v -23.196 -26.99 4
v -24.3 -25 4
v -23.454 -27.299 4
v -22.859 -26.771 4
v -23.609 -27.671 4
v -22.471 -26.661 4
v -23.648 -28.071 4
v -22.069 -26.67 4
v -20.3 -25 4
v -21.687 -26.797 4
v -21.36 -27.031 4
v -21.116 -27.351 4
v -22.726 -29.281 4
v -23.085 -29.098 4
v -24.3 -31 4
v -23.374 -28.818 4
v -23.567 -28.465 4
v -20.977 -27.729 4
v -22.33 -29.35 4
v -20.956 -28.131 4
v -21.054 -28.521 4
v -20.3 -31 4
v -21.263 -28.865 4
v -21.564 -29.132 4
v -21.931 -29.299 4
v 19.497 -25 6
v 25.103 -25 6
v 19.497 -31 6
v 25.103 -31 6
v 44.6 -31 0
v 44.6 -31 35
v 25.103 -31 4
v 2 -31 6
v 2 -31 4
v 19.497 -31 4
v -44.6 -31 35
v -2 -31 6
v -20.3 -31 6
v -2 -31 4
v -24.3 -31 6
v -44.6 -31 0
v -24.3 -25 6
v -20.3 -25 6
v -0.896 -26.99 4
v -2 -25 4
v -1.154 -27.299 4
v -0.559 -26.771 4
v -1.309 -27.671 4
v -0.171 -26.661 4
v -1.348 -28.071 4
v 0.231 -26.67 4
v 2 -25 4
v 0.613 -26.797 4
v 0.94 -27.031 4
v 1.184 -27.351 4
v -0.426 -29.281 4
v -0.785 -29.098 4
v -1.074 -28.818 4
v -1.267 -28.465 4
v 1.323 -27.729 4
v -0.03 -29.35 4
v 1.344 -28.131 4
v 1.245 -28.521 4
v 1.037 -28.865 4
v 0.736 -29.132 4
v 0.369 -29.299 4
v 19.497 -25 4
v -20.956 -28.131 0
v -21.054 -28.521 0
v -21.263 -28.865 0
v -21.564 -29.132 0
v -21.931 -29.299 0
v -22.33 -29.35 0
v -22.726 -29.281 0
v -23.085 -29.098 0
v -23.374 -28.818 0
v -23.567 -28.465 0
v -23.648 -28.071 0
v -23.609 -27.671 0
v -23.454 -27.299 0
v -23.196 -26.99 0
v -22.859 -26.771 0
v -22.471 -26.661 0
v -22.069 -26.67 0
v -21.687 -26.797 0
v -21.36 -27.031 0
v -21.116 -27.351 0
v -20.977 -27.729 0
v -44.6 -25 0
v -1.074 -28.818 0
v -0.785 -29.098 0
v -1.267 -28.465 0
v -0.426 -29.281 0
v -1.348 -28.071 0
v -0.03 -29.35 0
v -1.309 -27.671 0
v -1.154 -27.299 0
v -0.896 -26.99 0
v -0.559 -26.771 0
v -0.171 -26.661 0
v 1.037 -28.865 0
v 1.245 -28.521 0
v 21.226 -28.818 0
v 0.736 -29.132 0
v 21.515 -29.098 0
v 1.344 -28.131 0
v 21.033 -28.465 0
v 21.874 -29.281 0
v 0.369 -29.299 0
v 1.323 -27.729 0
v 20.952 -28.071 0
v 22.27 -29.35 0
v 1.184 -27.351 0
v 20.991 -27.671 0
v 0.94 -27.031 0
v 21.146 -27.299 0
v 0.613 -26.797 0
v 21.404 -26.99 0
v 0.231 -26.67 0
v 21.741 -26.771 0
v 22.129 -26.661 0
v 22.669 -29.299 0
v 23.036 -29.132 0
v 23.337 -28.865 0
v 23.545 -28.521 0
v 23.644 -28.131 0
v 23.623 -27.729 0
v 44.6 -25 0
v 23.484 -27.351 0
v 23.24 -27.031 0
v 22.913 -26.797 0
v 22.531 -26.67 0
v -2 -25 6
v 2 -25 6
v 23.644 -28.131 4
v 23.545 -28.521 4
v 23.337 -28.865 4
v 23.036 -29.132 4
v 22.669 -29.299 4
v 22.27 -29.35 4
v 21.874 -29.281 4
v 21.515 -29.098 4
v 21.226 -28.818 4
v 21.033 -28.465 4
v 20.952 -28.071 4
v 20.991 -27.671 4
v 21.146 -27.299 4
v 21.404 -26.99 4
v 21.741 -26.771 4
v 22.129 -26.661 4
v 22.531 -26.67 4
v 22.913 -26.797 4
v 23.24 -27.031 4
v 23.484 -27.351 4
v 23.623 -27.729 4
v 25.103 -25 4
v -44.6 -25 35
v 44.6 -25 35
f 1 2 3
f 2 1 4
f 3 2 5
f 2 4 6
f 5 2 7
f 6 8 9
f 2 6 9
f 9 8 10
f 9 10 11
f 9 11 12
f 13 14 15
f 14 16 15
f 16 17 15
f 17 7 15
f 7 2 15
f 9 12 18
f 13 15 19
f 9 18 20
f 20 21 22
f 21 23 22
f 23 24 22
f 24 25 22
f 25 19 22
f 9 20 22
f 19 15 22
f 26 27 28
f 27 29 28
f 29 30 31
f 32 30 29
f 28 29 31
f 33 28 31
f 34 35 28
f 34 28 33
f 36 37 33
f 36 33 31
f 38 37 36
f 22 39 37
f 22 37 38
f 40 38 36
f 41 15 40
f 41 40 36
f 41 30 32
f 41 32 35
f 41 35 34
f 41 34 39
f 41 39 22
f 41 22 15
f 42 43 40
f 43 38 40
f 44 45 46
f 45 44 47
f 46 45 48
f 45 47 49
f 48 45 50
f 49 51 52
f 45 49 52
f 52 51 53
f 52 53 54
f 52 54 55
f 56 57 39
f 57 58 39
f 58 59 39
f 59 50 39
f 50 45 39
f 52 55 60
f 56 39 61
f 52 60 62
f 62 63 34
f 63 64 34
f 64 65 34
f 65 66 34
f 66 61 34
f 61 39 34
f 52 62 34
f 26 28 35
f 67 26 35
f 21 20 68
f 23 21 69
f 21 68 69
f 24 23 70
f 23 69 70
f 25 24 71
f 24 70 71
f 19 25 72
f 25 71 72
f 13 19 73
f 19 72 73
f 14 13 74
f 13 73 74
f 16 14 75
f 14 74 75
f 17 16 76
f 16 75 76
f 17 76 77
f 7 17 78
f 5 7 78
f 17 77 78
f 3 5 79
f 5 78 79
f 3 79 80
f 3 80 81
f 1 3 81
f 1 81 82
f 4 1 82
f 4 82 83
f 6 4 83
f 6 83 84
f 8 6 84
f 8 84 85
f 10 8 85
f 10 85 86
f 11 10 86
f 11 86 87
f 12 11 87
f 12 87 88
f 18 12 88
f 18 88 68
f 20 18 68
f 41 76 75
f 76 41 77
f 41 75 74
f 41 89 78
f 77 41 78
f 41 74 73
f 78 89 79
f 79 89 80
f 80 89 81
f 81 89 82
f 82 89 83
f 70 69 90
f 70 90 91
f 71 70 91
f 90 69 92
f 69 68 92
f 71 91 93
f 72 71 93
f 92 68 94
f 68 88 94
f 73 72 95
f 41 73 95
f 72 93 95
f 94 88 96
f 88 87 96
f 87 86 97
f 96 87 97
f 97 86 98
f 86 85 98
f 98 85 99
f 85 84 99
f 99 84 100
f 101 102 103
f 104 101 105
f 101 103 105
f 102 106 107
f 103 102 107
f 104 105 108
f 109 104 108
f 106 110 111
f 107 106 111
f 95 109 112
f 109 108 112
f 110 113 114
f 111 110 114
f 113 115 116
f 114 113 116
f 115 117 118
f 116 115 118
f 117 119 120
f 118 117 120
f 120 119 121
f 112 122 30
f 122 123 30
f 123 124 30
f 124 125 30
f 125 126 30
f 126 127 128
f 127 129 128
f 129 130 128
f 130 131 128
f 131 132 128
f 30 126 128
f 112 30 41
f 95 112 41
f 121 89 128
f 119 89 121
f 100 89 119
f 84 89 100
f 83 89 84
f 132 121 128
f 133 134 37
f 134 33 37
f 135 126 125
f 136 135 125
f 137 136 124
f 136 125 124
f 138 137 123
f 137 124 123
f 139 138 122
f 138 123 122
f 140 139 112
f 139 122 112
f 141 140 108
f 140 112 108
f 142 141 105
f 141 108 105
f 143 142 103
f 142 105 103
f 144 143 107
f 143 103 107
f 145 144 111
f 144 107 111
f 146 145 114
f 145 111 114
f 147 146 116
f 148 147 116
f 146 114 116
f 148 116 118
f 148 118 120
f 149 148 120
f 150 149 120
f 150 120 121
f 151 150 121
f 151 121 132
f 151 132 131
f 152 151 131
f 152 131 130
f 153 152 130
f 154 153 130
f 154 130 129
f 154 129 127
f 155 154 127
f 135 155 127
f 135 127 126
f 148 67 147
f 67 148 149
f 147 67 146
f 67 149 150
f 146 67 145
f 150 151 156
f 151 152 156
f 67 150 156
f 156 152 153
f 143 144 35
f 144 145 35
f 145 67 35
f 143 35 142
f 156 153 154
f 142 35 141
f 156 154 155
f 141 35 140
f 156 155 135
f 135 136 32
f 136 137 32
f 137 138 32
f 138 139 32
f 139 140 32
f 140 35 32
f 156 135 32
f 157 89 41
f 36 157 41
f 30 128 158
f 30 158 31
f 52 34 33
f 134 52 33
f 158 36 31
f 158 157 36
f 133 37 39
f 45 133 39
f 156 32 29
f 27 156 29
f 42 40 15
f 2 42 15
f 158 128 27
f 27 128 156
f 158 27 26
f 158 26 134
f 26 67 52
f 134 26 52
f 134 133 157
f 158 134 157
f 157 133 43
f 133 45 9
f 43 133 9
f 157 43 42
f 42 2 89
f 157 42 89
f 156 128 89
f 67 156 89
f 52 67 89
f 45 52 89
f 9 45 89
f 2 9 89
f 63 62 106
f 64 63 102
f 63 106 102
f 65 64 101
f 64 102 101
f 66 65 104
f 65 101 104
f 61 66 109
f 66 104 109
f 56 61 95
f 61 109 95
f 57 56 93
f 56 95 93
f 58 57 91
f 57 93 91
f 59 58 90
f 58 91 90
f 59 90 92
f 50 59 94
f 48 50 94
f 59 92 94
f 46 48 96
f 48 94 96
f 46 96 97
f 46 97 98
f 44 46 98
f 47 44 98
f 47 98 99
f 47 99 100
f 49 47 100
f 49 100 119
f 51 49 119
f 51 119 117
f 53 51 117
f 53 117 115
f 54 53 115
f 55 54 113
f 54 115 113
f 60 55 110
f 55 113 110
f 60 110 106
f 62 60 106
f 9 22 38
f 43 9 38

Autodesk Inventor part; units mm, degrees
ref_plane "YZ Plane" through (0, 0, 0) normal (1, 0, 0) x (0, 1, 0)
ref_plane "XZ Plane" through (0, 0, 0) normal (0, 1, 0) x (-1, 0, 0)
ref_plane "XY Plane" through (0, 0, 0) normal (0, 0, 1) x (1, 0, 0)
ref_plane "작업 평면4" through (-1.8693, 3.0801, 0) normal (0, 0, 1) x (0.9953009, -0.0968305, 0)
sketch "스케치1" plane through (-1.8693, 3.0801, 0) normal (0, 0, 1) x (0.9953009, -0.0968305, 0)
  circle A0 centre (-22.7477, 22.8243) radius 1.35 projected
  circle A1 centre (-43.8827, -21.2142) radius 1.35 projected
  circle A2 centre (21.6428, 27.143) radius 1.35 projected
  circle A3 centre (4.8701, -30.7532) radius 1.35 projected
  circle A4 centre (27.0653, -28.5939) radius 1.35 projected
  circle A5 centre (-0.5524, 24.9836) radius 1.35 projected
  circle A6 centre (-46.013, 0.6824) radius 1.3956 projected
  circle A7 centre (48.7397, 9.9006) radius 1.35 projected
  circle A8 centre (-17.3251, -32.9125) radius 1.35 projected
  circle A9 centre (50.8699, -11.996) radius 1.35 projected
  line L0 (68.8179, -26.0788) -> (63.0972, 32.7232) projected
  line L1 (60.913, 34.5202) -> (-62.7034, 22.4938) projected
  line L2 (-64.5004, 20.3096) -> (-58.7796, -38.4925) projected
  line L3 (-56.5954, -40.2895) -> (67.021, -28.2631) projected
  circle A10 centre (-49.3569, -21.7468) radius 1.35 projected
  circle A11 centre (-29.5905, 2.2801) radius 1.35 projected
  circle A12 centre (-51.4871, 0.1498) radius 1.35 projected
  circle A13 centre (-27.4602, -19.6165) radius 1.35 projected
  circle A14 centre (-38.4085, -20.6817) radius 1.35 projected
  circle A15 centre (-40.5388, 1.215) radius 1.35 projected
  circle A16 centre (34.4475, -13.5937) radius 1.35 projected
  circle A17 centre (54.2138, 10.4332) radius 1.35 projected
  circle A18 centre (45.3958, -12.5285) radius 1.35 projected
  circle A19 centre (32.3172, 8.3029) radius 1.35 projected
  circle A20 centre (43.2655, 9.3681) radius 1.35 projected
  circle A21 centre (56.3441, -11.4634) radius 1.35 projected
  circle A22 centre (-22.7477, 22.8243) radius 1.35 projected
  circle A23 centre (-43.8827, -21.2142) radius 1.35 projected
  circle A24 centre (21.6428, 27.143) radius 1.35 projected
  circle A25 centre (4.8701, -30.7532) radius 1.35 projected
  circle A26 centre (27.0653, -28.5939) radius 1.35 projected
  circle A27 centre (-0.5524, 24.9836) radius 1.35 projected
  circle A28 centre (-46.013, 0.6824) radius 1.3956 projected
  circle A29 centre (48.7397, 9.9006) radius 1.35 projected
  circle A30 centre (-17.3251, -32.9125) radius 1.35 projected
  circle A31 centre (50.8699, -11.996) radius 1.35 projected
  line L4 (68.8179, -26.0788) -> (63.0972, 32.7232) projected
  line L5 (-56.5954, -40.2895) -> (67.021, -28.2631) projected
  line L6 (-64.5004, 20.3096) -> (-58.7796, -38.4925) projected
  line L7 (60.913, 34.5202) -> (-62.7034, 22.4938) projected
  circle A32 centre (-49.3569, -21.7468) radius 1.35 projected
  circle A33 centre (-29.5905, 2.2801) radius 1.35 projected
  circle A34 centre (-51.4871, 0.1498) radius 1.35 projected
  circle A35 centre (-27.4602, -19.6165) radius 1.35 projected
  circle A36 centre (-38.4085, -20.6817) radius 1.35 projected
  circle A37 centre (-40.5388, 1.215) radius 1.35 projected
  circle A38 centre (34.4475, -13.5937) radius 1.35 projected
  circle A39 centre (54.2138, 10.4332) radius 1.35 projected
  circle A40 centre (45.3958, -12.5285) radius 1.35 projected
  circle A41 centre (32.3172, 8.3029) radius 1.35 projected
  circle A42 centre (43.2655, 9.3681) radius 1.35 projected
  circle A43 centre (56.3441, -11.4634) radius 1.35 projected
  line L8 (48.97, -23.4487) -> (-39.8109, -32.0859) projected
  line L9 (-39.8109, -32.0859) -> (-39.2299, -38.0578) projected
  line L10 (55.5228, -28.8395) -> (-45.2017, -38.6387) projected
  circle A44 centre (-17.3251, -32.9125) radius 1.35 projected
  circle A45 centre (4.8701, -30.7532) radius 1.35 projected
  circle A46 centre (27.0653, -28.5939) radius 1.35 projected
  line L11 (48.97, -23.4487) -> (-39.8109, -32.0859) projected
  line L12 (48.97, -23.4487) -> (49.551, -29.4205) projected
  circle A47 centre (-26.4824, -26.5694) radius 1.6 projected
  circle A48 centre (34.8281, -20.6047) radius 1.6 projected
  circle A49 centre (-30.5105, 14.8351) radius 1.6 projected
  circle A50 centre (30.8, 20.7999) radius 1.6 projected
  circle A51 centre (-26.4824, -26.5694) radius 1.6 projected
  circle A52 centre (34.8281, -20.6047) radius 1.6 projected
  circle A53 centre (-30.5105, 14.8351) radius 1.6 projected
  circle A54 centre (30.8, 20.7999) radius 1.6 projected
  arc A55 (67.021, -28.2631) -> (68.8179, -26.0788) centre (66.8273, -26.2725) ccw projected
  arc A56 (63.0972, 32.7232) -> (60.913, 34.5202) centre (61.1066, 32.5296) ccw projected
  arc A57 (-62.7034, 22.4938) -> (-64.5004, 20.3096) centre (-62.5098, 20.5032) ccw projected
  arc A58 (-58.7796, -38.4925) -> (-56.5954, -40.2895) centre (-56.789, -38.2989) ccw projected
  arc A59 (67.021, -28.2631) -> (68.8179, -26.0788) centre (66.8273, -26.2725) ccw projected
  arc A60 (-58.7796, -38.4925) -> (-56.5954, -40.2895) centre (-56.789, -38.2989) ccw projected
  arc A61 (-62.7034, 22.4938) -> (-64.5004, 20.3096) centre (-62.5098, 20.5032) ccw projected
  arc A62 (63.0972, 32.7232) -> (60.913, 34.5202) centre (61.1066, 32.5296) ccw projected
  point P0 (2.1588, -2.8846)
  point P1 (69.0116, -28.0694)
  point P2 (62.9036, 34.7138)
  point P3 (-64.694, 22.3002)
  point P4 (-58.586, -40.4831)
extrude "돌출1" add sketch "스케치1" along normal blind 35 contours L12 L10 L9 L8
sketch "스케치2" plane through (-1.8693, 3.0801, 35) normal (0, 0, 1) x (0.9953009, -0.0968305, 0)
  circle A0 centre (-17.3251, -32.9125) radius 1.35 projected
  circle A1 centre (4.8701, -30.7532) radius 1.35 projected
  circle A2 centre (27.0653, -28.5939) radius 1.35 projected
  point P0 (2.1588, -2.8846)
extrude "돌출2" add sketch "스케치2" against normal blind 30
ref_plane "작업 평면3" through (-44.6, -31.0001, 0) normal (0, -1, 0) x (1, 0, 0)
sketch "스케치3" plane through (-44.6, -31.0001, 0) normal (0, -1, 0) x (1, 0, 0)
  line L0 (45.95, 5) -> (43.25, 5) projected
  line L1 (68.25, 5) -> (65.55, 5) projected
  line L2 (23.65, 5) -> (20.95, 5) projected
  line L3 (64.0969, 4) -> (69.7031, 4)
  line L4 (69.7031, 4) -> (69.7031, 6)
  line L5 (69.7031, 6) -> (64.0969, 6)
  line L6 (64.0969, 6) -> (64.0969, 4)
  line L7 (64.0969, 4) -> (69.7031, 6) construction
  line L8 (69.7031, 4) -> (64.0969, 6) construction
  line L9 (42.6, 4) -> (46.6, 4)
  line L10 (46.6, 4) -> (46.6, 6)
  line L11 (46.6, 6) -> (42.6, 6)
  line L12 (42.6, 6) -> (42.6, 4)
  line L13 (42.6, 4) -> (46.6, 6) construction
  line L14 (46.6, 4) -> (42.6, 6) construction
  line L15 (20.3, 4) -> (24.3, 4)
  line L16 (24.3, 4) -> (24.3, 6)
  line L17 (24.3, 6) -> (20.3, 6)
  line L18 (20.3, 6) -> (20.3, 4)
  line L19 (20.3, 4) -> (24.3, 6) construction
  line L20 (24.3, 4) -> (20.3, 6) construction
  point P0 (44.6, 0)
  point P1 (66.9, 5)
  point P2 (44.6, 5)
  point P3 (22.3, 5)
  dimension "d4" = 2
  dimension "d5" = 4
  dimension "d6" = 2
  dimension "d7" = 4
extrude "돌출4" cut sketch "스케치3" against normal up to surface (6 mm away)
properties part number "_head_adt_" material "PMMA 플라스틱"
